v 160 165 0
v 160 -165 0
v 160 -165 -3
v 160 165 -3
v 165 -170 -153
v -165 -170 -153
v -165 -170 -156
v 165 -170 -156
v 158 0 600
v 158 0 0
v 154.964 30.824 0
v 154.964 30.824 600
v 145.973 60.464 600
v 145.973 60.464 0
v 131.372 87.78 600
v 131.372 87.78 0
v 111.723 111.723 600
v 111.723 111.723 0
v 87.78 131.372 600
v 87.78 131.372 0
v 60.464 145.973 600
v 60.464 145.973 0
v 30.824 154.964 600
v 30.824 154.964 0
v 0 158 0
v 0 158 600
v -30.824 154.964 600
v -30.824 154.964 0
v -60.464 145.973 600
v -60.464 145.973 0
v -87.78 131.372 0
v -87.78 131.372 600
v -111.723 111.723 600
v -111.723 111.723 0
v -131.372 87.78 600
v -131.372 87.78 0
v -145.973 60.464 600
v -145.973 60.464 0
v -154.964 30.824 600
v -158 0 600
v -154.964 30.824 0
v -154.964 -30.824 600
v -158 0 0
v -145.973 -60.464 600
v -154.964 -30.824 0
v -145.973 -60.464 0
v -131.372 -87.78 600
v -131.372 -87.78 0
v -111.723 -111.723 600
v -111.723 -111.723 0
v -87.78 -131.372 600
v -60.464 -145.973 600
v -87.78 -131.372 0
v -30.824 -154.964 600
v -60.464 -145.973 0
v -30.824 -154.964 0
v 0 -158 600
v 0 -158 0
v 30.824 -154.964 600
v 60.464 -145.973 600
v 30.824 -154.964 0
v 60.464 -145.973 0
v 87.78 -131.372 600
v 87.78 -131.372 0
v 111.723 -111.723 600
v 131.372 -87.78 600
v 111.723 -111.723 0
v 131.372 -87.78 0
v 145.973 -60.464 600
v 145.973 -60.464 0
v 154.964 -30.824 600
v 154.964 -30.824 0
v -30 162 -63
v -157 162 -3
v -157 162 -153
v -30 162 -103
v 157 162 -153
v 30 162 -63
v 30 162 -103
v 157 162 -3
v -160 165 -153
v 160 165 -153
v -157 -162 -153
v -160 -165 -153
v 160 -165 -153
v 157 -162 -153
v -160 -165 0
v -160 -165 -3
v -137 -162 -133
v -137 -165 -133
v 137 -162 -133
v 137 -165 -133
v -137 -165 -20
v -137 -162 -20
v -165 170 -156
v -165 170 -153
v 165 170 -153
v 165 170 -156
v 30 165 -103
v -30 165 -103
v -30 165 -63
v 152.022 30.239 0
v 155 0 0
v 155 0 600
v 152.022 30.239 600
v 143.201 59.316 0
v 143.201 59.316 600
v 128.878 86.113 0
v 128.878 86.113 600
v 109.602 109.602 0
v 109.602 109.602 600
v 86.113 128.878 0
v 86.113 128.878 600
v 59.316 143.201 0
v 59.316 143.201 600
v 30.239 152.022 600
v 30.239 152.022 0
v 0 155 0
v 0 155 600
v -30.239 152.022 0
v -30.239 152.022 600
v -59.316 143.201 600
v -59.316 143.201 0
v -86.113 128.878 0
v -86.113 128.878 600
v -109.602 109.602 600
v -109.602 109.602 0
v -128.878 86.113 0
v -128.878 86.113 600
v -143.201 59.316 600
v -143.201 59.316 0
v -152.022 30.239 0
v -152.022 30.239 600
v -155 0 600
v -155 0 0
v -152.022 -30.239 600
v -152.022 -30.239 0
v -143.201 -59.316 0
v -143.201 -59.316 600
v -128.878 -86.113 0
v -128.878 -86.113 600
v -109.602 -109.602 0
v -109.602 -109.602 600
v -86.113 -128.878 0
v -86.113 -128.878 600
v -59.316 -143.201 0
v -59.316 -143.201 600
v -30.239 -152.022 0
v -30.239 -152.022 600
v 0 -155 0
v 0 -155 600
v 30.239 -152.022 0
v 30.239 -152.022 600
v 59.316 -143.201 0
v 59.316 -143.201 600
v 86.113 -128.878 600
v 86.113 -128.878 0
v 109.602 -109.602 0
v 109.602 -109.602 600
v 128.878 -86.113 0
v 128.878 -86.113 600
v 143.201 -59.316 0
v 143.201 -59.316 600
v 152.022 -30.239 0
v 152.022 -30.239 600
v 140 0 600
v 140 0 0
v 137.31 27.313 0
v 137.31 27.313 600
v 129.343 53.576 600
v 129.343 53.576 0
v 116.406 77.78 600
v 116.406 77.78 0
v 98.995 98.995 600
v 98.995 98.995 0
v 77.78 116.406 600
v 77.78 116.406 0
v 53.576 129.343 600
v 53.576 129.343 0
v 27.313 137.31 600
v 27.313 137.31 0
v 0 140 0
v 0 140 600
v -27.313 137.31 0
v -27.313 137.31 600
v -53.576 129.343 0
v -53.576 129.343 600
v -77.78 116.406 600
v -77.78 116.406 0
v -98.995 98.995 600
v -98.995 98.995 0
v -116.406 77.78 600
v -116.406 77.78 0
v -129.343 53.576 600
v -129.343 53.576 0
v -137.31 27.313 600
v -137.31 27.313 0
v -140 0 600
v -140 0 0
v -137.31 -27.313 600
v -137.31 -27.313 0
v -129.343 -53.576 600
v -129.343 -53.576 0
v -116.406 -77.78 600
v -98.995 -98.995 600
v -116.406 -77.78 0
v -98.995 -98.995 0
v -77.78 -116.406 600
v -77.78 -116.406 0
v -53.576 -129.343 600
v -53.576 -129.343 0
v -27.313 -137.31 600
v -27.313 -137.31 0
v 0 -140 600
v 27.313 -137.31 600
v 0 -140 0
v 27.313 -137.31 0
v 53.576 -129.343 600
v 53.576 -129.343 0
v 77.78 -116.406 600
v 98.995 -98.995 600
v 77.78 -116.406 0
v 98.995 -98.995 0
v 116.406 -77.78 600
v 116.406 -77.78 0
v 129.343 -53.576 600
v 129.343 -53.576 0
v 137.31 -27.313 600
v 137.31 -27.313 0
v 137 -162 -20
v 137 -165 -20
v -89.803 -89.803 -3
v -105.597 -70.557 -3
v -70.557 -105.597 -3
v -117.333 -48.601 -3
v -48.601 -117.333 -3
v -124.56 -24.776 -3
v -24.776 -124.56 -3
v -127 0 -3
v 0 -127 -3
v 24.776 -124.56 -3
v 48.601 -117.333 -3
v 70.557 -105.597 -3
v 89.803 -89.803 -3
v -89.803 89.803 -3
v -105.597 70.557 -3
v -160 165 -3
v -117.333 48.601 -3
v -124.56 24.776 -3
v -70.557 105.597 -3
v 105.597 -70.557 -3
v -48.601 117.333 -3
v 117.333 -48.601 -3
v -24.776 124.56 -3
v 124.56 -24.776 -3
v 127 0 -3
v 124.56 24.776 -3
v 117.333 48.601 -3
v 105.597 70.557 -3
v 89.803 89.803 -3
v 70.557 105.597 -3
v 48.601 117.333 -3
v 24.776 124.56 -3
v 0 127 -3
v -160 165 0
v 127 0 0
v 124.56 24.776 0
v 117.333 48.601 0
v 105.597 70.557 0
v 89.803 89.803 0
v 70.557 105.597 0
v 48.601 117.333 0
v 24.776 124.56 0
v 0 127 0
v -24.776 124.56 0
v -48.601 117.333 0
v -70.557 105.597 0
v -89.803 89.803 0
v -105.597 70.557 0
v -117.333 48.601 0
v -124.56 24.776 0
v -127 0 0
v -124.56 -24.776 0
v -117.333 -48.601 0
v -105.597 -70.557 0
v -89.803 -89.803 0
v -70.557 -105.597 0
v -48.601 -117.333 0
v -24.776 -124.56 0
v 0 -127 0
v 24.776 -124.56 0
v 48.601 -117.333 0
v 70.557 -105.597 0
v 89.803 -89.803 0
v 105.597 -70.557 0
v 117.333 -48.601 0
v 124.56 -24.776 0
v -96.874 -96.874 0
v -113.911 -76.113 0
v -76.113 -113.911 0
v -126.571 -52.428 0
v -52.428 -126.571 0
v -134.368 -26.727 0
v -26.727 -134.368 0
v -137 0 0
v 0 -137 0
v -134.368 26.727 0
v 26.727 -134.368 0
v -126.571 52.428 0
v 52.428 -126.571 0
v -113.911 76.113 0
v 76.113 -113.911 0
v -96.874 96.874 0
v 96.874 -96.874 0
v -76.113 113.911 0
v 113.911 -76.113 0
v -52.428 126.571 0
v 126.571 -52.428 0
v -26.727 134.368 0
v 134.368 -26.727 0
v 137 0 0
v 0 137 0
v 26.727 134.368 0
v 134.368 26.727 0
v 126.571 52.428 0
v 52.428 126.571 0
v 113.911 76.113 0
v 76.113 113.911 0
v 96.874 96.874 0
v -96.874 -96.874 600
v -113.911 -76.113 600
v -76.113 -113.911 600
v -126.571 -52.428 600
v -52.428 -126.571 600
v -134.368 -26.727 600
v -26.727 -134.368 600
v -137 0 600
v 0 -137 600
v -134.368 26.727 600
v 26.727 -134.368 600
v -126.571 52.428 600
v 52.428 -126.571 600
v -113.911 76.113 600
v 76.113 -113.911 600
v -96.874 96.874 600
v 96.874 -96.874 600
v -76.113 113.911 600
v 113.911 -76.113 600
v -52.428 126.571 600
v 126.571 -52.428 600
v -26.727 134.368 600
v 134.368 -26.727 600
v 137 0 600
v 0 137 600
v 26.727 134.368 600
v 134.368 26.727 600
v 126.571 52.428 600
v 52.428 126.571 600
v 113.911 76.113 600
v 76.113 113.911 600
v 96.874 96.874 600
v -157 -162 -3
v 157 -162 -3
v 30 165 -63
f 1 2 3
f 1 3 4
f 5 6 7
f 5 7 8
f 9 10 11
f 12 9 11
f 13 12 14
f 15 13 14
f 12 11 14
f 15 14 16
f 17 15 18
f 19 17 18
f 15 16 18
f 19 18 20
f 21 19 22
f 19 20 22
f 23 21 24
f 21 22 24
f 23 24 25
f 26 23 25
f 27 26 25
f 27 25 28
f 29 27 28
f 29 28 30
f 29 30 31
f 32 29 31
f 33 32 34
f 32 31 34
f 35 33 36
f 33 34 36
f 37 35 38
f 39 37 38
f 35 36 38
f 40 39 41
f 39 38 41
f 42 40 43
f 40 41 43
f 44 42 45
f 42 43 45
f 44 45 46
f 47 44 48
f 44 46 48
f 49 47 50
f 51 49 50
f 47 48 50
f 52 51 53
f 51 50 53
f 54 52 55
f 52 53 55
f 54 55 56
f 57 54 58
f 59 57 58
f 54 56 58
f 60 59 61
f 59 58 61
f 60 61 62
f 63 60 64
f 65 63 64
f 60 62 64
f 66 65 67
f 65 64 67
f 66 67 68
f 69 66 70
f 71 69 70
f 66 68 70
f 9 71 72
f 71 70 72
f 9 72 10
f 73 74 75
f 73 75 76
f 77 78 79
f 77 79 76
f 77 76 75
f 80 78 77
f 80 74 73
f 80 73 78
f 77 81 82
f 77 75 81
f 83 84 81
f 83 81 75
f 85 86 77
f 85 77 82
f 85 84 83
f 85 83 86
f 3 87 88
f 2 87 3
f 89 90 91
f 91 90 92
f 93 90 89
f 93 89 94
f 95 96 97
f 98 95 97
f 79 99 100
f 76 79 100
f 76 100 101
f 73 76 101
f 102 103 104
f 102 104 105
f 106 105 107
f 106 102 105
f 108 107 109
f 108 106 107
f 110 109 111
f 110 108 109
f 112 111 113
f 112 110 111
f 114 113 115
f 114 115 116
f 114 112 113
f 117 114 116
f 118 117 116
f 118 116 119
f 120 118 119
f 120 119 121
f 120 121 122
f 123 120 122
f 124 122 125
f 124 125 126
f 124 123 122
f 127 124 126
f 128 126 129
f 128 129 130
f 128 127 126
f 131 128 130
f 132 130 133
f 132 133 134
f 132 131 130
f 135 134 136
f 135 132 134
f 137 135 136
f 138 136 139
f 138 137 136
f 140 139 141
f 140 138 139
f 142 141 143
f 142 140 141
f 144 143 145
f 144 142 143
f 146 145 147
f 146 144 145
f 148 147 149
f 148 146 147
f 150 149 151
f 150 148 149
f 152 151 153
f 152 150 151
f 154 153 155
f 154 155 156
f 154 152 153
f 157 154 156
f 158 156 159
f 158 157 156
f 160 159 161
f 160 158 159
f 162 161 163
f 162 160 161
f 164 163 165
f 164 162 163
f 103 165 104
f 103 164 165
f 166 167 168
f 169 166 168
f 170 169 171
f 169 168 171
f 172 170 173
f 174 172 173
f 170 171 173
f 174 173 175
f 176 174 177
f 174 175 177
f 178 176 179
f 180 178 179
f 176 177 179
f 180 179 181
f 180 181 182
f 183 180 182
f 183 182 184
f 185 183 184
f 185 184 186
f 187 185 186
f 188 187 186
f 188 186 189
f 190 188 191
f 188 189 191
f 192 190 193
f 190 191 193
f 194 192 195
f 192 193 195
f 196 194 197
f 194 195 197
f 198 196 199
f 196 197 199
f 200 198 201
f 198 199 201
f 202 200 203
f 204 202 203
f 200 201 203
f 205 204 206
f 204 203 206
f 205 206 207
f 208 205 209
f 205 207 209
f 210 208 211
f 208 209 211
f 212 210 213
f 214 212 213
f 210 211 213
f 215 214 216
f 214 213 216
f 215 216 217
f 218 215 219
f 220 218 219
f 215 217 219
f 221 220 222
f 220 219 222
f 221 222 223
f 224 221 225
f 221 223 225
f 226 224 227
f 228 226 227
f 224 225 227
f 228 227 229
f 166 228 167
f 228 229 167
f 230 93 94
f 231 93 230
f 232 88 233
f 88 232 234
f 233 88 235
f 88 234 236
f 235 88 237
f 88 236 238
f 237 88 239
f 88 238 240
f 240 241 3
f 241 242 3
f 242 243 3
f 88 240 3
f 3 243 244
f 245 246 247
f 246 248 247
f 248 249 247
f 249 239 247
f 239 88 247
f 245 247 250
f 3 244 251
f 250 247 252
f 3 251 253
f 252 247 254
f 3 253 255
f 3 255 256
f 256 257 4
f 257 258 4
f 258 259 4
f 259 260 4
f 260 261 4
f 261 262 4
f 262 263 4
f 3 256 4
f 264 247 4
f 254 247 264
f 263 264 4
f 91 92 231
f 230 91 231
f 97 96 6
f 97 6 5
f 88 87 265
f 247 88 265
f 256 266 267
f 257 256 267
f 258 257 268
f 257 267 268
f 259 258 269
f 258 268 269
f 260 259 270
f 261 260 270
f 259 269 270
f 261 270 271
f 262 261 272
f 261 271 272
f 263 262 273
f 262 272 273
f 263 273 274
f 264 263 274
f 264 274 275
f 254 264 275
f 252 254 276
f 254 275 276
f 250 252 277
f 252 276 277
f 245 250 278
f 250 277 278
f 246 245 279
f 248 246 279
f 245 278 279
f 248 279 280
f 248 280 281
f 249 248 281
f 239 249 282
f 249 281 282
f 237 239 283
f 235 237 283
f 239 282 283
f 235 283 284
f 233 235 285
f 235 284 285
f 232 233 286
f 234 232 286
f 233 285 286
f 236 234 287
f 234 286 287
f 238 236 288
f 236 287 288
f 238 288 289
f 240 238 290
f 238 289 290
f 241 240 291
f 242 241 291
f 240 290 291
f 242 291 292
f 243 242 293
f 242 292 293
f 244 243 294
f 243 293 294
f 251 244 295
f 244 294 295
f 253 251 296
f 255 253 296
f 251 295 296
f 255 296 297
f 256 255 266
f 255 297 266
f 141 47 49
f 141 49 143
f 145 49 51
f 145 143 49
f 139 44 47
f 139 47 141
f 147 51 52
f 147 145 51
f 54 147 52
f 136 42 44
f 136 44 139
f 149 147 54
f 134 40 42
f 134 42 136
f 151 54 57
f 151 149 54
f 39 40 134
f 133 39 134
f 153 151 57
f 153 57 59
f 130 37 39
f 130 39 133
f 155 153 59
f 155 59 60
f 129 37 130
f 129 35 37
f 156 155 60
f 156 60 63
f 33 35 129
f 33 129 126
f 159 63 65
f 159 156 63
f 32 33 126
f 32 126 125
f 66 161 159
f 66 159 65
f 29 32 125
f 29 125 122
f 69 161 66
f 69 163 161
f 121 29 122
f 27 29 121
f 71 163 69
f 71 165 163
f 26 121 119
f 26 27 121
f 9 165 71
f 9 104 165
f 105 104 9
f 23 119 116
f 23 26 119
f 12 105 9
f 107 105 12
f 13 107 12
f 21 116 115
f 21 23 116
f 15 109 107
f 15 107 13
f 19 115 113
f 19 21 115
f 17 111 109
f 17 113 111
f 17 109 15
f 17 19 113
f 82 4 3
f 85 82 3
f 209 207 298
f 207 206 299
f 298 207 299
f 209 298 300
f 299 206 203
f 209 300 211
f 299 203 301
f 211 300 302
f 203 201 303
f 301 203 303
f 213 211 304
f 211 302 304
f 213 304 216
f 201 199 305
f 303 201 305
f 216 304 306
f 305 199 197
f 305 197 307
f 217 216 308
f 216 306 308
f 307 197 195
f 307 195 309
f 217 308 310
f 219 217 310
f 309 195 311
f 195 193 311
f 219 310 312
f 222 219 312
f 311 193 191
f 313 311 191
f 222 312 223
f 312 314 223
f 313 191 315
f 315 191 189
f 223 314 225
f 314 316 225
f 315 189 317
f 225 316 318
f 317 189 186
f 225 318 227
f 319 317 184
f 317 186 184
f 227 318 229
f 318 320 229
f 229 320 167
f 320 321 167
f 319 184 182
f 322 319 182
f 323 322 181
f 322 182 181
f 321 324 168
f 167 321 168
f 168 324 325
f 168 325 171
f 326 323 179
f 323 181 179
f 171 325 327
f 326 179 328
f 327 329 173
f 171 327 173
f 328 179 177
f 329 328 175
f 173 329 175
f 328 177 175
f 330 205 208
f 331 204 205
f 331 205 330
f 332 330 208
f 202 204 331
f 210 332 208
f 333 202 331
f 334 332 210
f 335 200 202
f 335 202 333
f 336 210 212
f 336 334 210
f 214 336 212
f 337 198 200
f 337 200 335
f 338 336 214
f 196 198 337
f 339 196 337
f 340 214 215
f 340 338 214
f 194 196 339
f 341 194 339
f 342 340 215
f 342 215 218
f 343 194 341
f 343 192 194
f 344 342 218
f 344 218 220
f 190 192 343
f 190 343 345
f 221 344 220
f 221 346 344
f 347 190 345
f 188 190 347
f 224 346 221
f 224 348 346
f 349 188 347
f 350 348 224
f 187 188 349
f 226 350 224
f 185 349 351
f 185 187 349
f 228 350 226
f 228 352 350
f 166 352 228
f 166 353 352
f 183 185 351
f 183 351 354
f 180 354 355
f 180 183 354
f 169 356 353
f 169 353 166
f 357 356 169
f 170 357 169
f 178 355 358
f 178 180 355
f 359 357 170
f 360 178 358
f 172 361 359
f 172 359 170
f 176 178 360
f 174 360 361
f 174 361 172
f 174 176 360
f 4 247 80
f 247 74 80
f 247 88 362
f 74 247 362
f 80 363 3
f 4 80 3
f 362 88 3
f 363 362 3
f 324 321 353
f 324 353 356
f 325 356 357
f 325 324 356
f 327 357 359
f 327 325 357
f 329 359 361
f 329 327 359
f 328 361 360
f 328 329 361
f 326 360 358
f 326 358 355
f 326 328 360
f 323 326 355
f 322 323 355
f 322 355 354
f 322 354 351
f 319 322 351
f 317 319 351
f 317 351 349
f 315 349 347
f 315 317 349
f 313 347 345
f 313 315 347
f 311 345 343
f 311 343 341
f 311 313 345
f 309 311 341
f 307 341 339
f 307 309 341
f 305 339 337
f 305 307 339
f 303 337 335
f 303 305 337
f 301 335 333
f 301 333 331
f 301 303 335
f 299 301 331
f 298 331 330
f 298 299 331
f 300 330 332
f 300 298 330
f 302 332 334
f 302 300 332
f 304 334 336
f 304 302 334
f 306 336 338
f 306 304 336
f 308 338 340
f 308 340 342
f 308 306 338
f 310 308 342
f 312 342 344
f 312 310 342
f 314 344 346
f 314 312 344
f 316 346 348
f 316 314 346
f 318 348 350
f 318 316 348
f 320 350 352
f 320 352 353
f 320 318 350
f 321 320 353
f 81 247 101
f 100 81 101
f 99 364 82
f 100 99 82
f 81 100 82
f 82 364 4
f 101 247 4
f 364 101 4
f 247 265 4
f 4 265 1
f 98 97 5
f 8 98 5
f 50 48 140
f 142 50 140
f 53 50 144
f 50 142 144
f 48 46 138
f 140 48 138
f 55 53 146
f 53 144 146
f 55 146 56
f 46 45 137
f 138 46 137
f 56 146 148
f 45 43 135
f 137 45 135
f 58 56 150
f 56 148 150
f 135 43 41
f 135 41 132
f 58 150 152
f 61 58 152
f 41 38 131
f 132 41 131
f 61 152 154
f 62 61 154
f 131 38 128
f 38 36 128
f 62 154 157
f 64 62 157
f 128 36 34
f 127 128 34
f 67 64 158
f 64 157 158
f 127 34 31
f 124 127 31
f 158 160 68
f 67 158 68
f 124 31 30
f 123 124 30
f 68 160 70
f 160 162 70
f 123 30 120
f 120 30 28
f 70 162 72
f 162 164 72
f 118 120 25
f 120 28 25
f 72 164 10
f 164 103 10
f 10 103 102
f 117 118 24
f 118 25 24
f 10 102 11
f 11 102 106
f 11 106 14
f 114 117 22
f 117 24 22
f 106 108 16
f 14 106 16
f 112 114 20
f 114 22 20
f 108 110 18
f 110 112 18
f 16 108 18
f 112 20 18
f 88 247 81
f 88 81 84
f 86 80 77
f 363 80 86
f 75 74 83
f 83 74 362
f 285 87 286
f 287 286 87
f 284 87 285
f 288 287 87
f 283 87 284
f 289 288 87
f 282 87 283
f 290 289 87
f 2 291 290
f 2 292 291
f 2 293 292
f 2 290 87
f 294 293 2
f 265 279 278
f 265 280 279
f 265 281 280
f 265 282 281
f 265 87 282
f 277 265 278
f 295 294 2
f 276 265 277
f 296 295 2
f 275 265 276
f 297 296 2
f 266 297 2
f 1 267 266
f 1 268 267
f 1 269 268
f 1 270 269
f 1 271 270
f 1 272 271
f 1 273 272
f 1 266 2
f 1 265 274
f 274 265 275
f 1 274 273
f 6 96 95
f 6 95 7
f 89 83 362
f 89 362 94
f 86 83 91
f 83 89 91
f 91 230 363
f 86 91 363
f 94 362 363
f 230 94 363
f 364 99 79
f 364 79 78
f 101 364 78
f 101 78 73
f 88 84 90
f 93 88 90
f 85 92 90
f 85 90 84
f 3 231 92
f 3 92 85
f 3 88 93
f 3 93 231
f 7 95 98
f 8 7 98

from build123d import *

# Parameters (mm, degrees)
F0_R      = 140
F0_R_2    = 137
F1_DEPTH  = 600
F2_W      = 320
F2_H      = 330
F2_R      = 127
F3_DEPTH  = 3
F0_R_3    = 158
F0_R_4    = 155
F4_DEPTH  = 600
F5_W      = 320
F5_H      = 330
F5_W_2    = 314
F5_H_2    = 324
F6_DEPTH  = 150
F7_W      = 330
F7_H      = 340
F8_DEPTH  = 3
F9_W      = 274
F9_H      = 113
F10_DEPTH = 25
F11_W     = 60
F11_H     = 40
F12_DEPTH = 4


with BuildPart() as f1:
    # F0 (on Top) → F1 (new body)
    with BuildSketch(Plane.XY):
        Circle(F0_R)
        Circle(F0_R_2, mode=Mode.SUBTRACT)
    extrude(amount=F1_DEPTH)


with BuildPart() as f3:
    # F2 (on Top) → F3 (new body)
    with BuildSketch(Plane.XY):
        Rectangle(F2_W, F2_H)
        Circle(F2_R, mode=Mode.SUBTRACT)
    extrude(amount=-F3_DEPTH)


with BuildPart() as f4:
    # F0 (on Top) → F4 (new body)
    with BuildSketch(Plane.XY):
        Circle(F0_R_3)
        Circle(F0_R_4, mode=Mode.SUBTRACT)
    extrude(amount=F4_DEPTH)


with BuildPart() as f6:
    # F5 (on face) → F6 (new body)
    with BuildSketch(Plane(origin=(0, 0, -3), x_dir=(1, 0, 0), z_dir=(0, 0, -1))):
        Rectangle(F5_W, F5_H)
        Rectangle(F5_W_2, F5_H_2, mode=Mode.SUBTRACT)
    extrude(amount=F6_DEPTH)

    # F9 (on face) → F10 (cut)
    with BuildSketch(Plane.XZ.offset(165)):
        with Locations((0, -76.5)):
            Rectangle(F9_W, F9_H)
    extrude(amount=-F10_DEPTH, mode=Mode.SUBTRACT)

    # F11 (on face) → F12 (cut)
    with BuildSketch(Plane(origin=(0, 165, 0), x_dir=(-1, 0, 0), z_dir=(0, 1, 0))):
        with Locations((0, -83)):
            Rectangle(F11_W, F11_H)
    extrude(amount=-F12_DEPTH, mode=Mode.SUBTRACT)


with BuildPart() as f8:
    # F7 (on face) → F8 (new body)
    with BuildSketch(Plane(origin=(0, 0, -153), x_dir=(1, 0, 0), z_dir=(0, 0, -1))):
        Rectangle(F7_W, F7_H)
    extrude(amount=F8_DEPTH)


solid = Compound([f1.part, f3.part, f4.part, f6.part, f8.part])
